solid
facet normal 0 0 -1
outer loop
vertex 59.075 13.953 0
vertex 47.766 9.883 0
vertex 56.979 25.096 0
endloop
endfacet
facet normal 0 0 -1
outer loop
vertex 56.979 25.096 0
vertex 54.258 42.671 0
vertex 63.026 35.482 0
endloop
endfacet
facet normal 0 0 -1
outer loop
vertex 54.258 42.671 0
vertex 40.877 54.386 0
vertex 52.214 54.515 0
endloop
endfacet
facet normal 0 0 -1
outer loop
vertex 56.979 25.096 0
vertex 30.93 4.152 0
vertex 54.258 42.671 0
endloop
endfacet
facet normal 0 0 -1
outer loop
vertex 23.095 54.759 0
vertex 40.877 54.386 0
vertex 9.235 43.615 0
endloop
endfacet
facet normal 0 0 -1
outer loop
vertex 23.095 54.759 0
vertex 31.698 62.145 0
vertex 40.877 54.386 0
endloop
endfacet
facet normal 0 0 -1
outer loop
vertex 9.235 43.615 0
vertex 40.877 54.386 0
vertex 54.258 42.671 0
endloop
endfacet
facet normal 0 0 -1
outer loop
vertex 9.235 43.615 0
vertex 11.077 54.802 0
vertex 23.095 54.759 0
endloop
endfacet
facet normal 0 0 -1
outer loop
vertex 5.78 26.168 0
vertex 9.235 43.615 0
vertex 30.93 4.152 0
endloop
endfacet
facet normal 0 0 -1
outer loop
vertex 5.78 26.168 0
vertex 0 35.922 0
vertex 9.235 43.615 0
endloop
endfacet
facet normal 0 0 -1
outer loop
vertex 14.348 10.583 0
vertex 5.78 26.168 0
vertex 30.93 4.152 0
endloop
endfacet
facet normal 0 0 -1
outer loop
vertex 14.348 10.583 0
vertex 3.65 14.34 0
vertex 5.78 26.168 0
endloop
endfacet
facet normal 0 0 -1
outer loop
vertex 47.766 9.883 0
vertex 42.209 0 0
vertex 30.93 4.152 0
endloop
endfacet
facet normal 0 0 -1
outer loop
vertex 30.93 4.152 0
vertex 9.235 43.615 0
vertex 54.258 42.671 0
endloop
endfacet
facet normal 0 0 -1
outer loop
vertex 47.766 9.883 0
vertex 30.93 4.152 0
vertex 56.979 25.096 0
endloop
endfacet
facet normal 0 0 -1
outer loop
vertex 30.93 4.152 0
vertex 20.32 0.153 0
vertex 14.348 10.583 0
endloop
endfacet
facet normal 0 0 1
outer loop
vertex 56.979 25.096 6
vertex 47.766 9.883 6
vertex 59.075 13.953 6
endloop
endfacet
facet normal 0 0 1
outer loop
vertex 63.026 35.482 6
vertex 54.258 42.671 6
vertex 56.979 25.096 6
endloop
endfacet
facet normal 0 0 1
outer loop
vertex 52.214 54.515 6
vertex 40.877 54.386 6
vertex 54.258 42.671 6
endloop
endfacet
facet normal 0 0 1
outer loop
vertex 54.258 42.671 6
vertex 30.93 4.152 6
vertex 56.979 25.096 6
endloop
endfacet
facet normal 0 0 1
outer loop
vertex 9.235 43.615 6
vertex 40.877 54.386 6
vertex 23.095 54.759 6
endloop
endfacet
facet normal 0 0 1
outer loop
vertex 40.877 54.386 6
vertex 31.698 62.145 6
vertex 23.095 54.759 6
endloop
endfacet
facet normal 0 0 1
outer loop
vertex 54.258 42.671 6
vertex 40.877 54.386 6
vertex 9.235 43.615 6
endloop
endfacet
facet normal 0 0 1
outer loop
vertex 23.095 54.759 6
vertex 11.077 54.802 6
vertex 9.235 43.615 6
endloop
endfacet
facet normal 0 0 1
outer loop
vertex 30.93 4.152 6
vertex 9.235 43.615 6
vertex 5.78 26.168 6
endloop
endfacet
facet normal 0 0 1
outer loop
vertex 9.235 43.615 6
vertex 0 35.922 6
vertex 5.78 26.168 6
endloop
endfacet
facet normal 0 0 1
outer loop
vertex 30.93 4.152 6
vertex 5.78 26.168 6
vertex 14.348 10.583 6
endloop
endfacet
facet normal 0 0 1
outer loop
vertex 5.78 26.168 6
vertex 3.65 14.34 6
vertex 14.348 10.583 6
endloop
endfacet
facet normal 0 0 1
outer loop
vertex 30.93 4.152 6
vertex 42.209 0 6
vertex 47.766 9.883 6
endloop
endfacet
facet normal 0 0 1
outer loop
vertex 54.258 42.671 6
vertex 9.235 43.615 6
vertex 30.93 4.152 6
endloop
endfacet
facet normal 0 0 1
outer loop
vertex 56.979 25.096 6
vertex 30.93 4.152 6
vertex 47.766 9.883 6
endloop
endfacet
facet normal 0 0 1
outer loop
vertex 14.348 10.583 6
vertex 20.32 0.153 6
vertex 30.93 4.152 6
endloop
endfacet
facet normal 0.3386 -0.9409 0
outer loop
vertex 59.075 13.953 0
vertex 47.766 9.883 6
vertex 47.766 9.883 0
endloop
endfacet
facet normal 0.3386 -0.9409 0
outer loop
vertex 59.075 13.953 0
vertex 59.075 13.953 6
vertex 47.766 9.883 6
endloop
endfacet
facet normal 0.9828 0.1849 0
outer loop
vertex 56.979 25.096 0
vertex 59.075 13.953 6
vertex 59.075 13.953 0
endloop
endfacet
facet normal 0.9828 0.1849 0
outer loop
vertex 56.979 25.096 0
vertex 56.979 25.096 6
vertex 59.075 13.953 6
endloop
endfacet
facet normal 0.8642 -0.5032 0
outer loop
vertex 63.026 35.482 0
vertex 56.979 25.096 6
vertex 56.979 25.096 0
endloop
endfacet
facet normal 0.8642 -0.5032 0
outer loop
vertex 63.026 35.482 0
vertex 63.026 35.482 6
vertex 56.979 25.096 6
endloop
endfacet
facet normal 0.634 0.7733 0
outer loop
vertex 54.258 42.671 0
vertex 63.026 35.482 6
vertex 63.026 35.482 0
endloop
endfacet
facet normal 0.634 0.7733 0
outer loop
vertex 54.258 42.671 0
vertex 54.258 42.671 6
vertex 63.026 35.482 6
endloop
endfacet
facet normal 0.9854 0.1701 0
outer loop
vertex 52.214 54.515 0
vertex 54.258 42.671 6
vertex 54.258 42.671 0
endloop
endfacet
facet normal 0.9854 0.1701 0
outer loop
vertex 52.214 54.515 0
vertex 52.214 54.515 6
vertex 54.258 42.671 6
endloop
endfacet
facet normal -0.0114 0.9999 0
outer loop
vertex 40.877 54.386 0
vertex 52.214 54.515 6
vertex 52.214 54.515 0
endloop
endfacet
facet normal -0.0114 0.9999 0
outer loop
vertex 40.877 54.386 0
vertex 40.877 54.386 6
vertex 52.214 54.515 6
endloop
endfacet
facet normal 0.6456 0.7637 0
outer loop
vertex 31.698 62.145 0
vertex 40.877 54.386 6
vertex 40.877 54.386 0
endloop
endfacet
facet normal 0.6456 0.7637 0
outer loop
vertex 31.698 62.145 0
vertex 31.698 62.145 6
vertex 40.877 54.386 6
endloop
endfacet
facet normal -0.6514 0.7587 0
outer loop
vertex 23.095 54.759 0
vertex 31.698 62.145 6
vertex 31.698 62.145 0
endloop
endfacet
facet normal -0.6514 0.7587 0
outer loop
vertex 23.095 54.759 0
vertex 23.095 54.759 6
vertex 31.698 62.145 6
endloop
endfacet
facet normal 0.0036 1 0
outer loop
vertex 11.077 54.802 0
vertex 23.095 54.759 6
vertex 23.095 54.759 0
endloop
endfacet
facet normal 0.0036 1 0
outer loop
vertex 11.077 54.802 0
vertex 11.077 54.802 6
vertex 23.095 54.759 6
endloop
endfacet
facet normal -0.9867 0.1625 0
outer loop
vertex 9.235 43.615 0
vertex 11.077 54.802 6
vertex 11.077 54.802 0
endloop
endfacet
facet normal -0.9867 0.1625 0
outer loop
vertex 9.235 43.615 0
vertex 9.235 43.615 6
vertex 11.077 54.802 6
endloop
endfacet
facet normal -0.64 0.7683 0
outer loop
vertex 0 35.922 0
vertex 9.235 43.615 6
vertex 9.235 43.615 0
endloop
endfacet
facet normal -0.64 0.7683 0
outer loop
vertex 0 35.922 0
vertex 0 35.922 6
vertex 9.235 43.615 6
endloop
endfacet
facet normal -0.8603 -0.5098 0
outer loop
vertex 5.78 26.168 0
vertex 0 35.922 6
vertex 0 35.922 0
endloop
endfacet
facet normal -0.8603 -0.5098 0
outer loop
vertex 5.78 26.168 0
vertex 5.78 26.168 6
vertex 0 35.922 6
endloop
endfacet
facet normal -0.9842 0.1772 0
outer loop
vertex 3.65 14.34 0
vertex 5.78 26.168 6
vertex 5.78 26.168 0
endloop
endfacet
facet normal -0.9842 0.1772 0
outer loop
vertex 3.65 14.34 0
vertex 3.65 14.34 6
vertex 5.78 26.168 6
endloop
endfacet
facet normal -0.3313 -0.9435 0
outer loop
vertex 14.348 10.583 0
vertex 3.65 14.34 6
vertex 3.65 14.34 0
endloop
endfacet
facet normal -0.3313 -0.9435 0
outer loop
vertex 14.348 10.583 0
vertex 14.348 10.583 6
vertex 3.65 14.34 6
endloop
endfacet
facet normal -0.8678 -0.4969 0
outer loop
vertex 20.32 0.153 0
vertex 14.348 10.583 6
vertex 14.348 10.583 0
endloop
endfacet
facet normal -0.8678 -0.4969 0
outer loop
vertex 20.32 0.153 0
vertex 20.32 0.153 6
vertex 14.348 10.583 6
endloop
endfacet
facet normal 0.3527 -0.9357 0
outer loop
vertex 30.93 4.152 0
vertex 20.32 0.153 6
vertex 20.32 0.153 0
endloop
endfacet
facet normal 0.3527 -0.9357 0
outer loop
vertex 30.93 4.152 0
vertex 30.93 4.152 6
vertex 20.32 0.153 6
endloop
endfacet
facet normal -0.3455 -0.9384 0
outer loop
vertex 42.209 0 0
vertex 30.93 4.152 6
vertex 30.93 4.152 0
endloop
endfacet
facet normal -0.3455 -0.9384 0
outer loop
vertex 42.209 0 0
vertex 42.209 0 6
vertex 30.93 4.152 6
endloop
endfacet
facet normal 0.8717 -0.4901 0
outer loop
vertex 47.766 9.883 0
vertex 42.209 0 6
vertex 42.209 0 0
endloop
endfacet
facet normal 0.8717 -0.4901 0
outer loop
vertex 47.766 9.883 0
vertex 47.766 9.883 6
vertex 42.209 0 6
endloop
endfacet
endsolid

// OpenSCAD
$fn = 32;

// ----------------------------------------------------------------------
// Chain sprocket: 9 teeth, 26 mm root radius
// ----------------------------------------------------------------------

// --- parameters (mm) ---
profile_height = 6;       // extrusion height
profile_points = 18;      // points of the closed outline

profile = [[56.979, 25.096], [63.026, 35.482], [54.258, 42.671], [52.214, 54.515], [40.877, 54.386], [31.698, 62.145], [23.095, 54.759], [11.077, 54.802], [9.235, 43.615], [0, 35.922], [5.78, 26.168], [3.65, 14.34], [14.348, 10.583], [20.32, 0.153], [30.93, 4.152], [42.209, 0], [47.766, 9.883], [59.075, 13.953]];  // single closed polygon, 18 points, counter clockwise

// --- the one profile operation ---
linear_extrude(height = profile_height) polygon(points = profile);
